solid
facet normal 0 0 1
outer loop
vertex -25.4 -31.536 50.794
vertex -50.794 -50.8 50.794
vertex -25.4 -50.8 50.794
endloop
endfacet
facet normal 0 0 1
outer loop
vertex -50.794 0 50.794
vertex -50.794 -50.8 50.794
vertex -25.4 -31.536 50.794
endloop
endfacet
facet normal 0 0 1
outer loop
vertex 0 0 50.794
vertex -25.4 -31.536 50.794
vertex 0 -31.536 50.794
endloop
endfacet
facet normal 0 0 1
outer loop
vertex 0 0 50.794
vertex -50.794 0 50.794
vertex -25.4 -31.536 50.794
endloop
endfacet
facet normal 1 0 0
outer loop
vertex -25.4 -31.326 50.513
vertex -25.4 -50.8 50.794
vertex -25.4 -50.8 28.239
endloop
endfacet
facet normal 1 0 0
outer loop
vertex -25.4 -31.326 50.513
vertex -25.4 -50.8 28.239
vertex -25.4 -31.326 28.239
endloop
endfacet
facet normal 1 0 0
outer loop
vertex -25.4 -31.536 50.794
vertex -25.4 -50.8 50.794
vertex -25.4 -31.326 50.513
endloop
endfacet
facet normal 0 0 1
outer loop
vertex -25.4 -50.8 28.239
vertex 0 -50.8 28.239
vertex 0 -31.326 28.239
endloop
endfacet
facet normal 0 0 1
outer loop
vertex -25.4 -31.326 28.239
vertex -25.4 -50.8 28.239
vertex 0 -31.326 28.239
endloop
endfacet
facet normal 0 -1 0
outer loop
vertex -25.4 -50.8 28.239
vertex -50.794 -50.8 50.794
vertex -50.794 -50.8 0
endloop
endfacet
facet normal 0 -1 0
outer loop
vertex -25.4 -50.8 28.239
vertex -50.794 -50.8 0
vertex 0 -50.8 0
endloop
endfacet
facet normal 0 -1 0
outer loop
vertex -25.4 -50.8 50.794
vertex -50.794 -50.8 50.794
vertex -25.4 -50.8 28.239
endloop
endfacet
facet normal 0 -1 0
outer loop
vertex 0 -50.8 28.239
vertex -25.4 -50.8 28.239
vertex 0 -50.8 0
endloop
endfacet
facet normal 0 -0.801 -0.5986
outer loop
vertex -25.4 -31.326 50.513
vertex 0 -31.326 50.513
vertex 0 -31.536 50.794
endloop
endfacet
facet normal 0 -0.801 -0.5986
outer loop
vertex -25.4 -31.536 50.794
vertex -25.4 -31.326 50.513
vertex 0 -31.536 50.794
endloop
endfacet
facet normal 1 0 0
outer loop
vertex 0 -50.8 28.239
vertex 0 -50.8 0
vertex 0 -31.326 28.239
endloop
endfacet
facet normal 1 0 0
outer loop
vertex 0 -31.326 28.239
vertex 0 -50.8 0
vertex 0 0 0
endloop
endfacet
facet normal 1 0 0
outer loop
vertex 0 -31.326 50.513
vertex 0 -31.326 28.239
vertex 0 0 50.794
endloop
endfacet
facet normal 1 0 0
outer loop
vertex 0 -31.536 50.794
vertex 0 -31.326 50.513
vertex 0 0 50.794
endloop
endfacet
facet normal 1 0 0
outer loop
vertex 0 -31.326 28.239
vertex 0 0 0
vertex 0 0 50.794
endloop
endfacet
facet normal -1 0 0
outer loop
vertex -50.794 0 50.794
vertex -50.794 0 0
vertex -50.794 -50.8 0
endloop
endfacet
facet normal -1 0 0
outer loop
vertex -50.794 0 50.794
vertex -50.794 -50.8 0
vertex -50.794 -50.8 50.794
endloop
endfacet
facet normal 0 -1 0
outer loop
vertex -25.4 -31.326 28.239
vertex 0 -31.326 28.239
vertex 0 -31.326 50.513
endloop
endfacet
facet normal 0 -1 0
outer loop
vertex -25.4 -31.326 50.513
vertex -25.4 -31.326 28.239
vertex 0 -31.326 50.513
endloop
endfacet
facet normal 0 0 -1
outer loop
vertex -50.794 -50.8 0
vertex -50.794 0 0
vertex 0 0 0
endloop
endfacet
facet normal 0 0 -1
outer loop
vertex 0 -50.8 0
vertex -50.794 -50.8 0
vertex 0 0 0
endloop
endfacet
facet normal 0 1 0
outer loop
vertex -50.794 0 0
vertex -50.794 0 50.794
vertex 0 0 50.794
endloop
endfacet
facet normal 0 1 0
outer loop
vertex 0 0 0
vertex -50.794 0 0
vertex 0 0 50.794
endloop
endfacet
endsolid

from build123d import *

# Parameters (mm, degrees)
F0_W     = 50.793938
F0_H     = 50.793935
F1_DEPTH = 50.8
F3_DEPTH = 25.4


with BuildPart() as f1:
    # F0 (on Front) → F1 (new body)
    with BuildSketch(Plane.XZ):
        with Locations((-25.396969, 25.396967)):
            Rectangle(F0_W, F0_H)
    extrude(amount=F1_DEPTH)

    # F2 (on Right) → F3 (cut)
    with BuildSketch(Plane.YZ):
        Polygon((-31.325877, 50.512649), (-52.65988, 79.119146), (-72.913677, 79.119146), (-72.913677, 55.439733), (-51.039577, 28.238516), (-31.325877, 28.238516), align=None)
    extrude(amount=-F3_DEPTH, mode=Mode.SUBTRACT)


solid = f1.part
